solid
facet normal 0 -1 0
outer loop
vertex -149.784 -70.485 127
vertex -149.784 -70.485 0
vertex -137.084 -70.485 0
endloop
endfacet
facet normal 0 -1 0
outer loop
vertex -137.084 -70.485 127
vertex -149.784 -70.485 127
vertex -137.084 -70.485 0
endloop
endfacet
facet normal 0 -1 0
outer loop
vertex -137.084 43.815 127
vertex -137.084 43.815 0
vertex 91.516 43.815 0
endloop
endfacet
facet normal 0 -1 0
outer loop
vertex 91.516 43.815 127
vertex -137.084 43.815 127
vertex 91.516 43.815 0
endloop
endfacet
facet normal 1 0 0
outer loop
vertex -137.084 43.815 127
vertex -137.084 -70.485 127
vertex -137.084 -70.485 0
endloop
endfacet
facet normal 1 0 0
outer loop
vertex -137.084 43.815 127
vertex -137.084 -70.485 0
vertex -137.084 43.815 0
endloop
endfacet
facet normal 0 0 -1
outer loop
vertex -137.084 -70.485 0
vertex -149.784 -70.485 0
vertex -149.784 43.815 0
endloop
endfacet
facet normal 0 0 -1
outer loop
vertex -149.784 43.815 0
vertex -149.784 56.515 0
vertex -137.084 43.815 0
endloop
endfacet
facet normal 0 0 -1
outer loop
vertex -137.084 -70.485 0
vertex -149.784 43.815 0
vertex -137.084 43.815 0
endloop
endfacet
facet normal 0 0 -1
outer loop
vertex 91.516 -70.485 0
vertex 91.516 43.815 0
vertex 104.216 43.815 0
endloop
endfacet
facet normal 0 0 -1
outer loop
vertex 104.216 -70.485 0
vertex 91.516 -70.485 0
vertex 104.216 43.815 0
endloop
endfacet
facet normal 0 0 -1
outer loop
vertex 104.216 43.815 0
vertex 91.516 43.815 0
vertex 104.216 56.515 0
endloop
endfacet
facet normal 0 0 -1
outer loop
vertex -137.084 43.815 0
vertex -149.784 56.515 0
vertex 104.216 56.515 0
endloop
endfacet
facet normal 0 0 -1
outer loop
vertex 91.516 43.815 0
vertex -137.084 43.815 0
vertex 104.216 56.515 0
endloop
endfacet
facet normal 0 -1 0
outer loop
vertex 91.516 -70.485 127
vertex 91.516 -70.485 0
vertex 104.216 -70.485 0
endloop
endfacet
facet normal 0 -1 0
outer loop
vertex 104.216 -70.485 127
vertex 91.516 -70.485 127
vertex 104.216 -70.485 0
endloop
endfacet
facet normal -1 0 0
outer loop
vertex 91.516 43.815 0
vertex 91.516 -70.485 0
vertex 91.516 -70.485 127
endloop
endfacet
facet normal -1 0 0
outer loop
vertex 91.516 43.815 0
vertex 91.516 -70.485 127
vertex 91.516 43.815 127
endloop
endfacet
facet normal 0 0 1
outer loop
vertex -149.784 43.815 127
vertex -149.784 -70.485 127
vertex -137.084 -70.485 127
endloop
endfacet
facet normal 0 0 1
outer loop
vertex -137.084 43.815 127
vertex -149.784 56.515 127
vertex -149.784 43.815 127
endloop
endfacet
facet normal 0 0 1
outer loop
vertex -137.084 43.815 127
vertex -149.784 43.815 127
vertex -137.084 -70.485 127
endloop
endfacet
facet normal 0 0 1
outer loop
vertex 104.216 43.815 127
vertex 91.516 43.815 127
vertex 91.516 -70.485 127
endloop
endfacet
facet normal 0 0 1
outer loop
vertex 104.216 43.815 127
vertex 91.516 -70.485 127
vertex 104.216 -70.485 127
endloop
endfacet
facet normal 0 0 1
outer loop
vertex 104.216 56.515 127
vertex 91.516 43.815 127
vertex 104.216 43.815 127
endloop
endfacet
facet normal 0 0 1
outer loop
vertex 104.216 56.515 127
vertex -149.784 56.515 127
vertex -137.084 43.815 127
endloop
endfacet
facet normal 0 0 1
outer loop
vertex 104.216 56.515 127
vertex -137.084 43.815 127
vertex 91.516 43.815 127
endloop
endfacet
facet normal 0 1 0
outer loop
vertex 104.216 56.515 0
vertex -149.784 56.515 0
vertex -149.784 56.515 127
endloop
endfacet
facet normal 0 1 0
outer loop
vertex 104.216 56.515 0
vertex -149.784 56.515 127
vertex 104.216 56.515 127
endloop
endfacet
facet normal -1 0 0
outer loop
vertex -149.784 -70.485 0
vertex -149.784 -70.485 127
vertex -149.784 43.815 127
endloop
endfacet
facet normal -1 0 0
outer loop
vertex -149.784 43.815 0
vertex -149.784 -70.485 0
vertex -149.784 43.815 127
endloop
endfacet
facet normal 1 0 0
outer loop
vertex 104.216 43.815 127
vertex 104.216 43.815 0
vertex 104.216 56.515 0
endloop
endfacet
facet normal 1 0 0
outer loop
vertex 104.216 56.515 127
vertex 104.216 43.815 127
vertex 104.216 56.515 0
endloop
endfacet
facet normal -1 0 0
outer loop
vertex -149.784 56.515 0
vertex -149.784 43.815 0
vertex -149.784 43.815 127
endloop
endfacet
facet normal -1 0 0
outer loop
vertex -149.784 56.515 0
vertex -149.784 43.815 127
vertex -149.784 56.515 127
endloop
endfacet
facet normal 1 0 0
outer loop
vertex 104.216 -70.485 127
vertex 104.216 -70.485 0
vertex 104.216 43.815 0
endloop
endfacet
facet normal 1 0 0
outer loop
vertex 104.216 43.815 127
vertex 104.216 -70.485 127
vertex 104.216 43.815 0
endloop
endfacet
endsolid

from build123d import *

# Parameters (mm, degrees)
F0_W     = 254
F0_H     = 12.7
F1_DEPTH = 127
F2_W     = 12.7
F2_H     = 114.3
F3_DEPTH = 127
F4_W     = 12.7
F4_H     = 114.3
F5_DEPTH = 127


with BuildPart() as f1:
    # F0 (on Top) → F1 (new body)
    with BuildSketch(Plane.XY):
        with Locations((-22.784118, 50.164945)):
            Rectangle(F0_W, F0_H)
    extrude(amount=F1_DEPTH)

    # F2 (on Top) → F3 (join)
    with BuildSketch(Plane.XY):
        with Locations((-143.434073, -13.334987)):
            Rectangle(F2_W, F2_H)
    extrude(amount=F3_DEPTH)

    # F4 (on Top) → F5 (join)
    with BuildSketch(Plane.XY):
        with Locations((97.865868, -13.334994)):
            Rectangle(F4_W, F4_H)
    extrude(amount=F5_DEPTH)


solid = f1.part
